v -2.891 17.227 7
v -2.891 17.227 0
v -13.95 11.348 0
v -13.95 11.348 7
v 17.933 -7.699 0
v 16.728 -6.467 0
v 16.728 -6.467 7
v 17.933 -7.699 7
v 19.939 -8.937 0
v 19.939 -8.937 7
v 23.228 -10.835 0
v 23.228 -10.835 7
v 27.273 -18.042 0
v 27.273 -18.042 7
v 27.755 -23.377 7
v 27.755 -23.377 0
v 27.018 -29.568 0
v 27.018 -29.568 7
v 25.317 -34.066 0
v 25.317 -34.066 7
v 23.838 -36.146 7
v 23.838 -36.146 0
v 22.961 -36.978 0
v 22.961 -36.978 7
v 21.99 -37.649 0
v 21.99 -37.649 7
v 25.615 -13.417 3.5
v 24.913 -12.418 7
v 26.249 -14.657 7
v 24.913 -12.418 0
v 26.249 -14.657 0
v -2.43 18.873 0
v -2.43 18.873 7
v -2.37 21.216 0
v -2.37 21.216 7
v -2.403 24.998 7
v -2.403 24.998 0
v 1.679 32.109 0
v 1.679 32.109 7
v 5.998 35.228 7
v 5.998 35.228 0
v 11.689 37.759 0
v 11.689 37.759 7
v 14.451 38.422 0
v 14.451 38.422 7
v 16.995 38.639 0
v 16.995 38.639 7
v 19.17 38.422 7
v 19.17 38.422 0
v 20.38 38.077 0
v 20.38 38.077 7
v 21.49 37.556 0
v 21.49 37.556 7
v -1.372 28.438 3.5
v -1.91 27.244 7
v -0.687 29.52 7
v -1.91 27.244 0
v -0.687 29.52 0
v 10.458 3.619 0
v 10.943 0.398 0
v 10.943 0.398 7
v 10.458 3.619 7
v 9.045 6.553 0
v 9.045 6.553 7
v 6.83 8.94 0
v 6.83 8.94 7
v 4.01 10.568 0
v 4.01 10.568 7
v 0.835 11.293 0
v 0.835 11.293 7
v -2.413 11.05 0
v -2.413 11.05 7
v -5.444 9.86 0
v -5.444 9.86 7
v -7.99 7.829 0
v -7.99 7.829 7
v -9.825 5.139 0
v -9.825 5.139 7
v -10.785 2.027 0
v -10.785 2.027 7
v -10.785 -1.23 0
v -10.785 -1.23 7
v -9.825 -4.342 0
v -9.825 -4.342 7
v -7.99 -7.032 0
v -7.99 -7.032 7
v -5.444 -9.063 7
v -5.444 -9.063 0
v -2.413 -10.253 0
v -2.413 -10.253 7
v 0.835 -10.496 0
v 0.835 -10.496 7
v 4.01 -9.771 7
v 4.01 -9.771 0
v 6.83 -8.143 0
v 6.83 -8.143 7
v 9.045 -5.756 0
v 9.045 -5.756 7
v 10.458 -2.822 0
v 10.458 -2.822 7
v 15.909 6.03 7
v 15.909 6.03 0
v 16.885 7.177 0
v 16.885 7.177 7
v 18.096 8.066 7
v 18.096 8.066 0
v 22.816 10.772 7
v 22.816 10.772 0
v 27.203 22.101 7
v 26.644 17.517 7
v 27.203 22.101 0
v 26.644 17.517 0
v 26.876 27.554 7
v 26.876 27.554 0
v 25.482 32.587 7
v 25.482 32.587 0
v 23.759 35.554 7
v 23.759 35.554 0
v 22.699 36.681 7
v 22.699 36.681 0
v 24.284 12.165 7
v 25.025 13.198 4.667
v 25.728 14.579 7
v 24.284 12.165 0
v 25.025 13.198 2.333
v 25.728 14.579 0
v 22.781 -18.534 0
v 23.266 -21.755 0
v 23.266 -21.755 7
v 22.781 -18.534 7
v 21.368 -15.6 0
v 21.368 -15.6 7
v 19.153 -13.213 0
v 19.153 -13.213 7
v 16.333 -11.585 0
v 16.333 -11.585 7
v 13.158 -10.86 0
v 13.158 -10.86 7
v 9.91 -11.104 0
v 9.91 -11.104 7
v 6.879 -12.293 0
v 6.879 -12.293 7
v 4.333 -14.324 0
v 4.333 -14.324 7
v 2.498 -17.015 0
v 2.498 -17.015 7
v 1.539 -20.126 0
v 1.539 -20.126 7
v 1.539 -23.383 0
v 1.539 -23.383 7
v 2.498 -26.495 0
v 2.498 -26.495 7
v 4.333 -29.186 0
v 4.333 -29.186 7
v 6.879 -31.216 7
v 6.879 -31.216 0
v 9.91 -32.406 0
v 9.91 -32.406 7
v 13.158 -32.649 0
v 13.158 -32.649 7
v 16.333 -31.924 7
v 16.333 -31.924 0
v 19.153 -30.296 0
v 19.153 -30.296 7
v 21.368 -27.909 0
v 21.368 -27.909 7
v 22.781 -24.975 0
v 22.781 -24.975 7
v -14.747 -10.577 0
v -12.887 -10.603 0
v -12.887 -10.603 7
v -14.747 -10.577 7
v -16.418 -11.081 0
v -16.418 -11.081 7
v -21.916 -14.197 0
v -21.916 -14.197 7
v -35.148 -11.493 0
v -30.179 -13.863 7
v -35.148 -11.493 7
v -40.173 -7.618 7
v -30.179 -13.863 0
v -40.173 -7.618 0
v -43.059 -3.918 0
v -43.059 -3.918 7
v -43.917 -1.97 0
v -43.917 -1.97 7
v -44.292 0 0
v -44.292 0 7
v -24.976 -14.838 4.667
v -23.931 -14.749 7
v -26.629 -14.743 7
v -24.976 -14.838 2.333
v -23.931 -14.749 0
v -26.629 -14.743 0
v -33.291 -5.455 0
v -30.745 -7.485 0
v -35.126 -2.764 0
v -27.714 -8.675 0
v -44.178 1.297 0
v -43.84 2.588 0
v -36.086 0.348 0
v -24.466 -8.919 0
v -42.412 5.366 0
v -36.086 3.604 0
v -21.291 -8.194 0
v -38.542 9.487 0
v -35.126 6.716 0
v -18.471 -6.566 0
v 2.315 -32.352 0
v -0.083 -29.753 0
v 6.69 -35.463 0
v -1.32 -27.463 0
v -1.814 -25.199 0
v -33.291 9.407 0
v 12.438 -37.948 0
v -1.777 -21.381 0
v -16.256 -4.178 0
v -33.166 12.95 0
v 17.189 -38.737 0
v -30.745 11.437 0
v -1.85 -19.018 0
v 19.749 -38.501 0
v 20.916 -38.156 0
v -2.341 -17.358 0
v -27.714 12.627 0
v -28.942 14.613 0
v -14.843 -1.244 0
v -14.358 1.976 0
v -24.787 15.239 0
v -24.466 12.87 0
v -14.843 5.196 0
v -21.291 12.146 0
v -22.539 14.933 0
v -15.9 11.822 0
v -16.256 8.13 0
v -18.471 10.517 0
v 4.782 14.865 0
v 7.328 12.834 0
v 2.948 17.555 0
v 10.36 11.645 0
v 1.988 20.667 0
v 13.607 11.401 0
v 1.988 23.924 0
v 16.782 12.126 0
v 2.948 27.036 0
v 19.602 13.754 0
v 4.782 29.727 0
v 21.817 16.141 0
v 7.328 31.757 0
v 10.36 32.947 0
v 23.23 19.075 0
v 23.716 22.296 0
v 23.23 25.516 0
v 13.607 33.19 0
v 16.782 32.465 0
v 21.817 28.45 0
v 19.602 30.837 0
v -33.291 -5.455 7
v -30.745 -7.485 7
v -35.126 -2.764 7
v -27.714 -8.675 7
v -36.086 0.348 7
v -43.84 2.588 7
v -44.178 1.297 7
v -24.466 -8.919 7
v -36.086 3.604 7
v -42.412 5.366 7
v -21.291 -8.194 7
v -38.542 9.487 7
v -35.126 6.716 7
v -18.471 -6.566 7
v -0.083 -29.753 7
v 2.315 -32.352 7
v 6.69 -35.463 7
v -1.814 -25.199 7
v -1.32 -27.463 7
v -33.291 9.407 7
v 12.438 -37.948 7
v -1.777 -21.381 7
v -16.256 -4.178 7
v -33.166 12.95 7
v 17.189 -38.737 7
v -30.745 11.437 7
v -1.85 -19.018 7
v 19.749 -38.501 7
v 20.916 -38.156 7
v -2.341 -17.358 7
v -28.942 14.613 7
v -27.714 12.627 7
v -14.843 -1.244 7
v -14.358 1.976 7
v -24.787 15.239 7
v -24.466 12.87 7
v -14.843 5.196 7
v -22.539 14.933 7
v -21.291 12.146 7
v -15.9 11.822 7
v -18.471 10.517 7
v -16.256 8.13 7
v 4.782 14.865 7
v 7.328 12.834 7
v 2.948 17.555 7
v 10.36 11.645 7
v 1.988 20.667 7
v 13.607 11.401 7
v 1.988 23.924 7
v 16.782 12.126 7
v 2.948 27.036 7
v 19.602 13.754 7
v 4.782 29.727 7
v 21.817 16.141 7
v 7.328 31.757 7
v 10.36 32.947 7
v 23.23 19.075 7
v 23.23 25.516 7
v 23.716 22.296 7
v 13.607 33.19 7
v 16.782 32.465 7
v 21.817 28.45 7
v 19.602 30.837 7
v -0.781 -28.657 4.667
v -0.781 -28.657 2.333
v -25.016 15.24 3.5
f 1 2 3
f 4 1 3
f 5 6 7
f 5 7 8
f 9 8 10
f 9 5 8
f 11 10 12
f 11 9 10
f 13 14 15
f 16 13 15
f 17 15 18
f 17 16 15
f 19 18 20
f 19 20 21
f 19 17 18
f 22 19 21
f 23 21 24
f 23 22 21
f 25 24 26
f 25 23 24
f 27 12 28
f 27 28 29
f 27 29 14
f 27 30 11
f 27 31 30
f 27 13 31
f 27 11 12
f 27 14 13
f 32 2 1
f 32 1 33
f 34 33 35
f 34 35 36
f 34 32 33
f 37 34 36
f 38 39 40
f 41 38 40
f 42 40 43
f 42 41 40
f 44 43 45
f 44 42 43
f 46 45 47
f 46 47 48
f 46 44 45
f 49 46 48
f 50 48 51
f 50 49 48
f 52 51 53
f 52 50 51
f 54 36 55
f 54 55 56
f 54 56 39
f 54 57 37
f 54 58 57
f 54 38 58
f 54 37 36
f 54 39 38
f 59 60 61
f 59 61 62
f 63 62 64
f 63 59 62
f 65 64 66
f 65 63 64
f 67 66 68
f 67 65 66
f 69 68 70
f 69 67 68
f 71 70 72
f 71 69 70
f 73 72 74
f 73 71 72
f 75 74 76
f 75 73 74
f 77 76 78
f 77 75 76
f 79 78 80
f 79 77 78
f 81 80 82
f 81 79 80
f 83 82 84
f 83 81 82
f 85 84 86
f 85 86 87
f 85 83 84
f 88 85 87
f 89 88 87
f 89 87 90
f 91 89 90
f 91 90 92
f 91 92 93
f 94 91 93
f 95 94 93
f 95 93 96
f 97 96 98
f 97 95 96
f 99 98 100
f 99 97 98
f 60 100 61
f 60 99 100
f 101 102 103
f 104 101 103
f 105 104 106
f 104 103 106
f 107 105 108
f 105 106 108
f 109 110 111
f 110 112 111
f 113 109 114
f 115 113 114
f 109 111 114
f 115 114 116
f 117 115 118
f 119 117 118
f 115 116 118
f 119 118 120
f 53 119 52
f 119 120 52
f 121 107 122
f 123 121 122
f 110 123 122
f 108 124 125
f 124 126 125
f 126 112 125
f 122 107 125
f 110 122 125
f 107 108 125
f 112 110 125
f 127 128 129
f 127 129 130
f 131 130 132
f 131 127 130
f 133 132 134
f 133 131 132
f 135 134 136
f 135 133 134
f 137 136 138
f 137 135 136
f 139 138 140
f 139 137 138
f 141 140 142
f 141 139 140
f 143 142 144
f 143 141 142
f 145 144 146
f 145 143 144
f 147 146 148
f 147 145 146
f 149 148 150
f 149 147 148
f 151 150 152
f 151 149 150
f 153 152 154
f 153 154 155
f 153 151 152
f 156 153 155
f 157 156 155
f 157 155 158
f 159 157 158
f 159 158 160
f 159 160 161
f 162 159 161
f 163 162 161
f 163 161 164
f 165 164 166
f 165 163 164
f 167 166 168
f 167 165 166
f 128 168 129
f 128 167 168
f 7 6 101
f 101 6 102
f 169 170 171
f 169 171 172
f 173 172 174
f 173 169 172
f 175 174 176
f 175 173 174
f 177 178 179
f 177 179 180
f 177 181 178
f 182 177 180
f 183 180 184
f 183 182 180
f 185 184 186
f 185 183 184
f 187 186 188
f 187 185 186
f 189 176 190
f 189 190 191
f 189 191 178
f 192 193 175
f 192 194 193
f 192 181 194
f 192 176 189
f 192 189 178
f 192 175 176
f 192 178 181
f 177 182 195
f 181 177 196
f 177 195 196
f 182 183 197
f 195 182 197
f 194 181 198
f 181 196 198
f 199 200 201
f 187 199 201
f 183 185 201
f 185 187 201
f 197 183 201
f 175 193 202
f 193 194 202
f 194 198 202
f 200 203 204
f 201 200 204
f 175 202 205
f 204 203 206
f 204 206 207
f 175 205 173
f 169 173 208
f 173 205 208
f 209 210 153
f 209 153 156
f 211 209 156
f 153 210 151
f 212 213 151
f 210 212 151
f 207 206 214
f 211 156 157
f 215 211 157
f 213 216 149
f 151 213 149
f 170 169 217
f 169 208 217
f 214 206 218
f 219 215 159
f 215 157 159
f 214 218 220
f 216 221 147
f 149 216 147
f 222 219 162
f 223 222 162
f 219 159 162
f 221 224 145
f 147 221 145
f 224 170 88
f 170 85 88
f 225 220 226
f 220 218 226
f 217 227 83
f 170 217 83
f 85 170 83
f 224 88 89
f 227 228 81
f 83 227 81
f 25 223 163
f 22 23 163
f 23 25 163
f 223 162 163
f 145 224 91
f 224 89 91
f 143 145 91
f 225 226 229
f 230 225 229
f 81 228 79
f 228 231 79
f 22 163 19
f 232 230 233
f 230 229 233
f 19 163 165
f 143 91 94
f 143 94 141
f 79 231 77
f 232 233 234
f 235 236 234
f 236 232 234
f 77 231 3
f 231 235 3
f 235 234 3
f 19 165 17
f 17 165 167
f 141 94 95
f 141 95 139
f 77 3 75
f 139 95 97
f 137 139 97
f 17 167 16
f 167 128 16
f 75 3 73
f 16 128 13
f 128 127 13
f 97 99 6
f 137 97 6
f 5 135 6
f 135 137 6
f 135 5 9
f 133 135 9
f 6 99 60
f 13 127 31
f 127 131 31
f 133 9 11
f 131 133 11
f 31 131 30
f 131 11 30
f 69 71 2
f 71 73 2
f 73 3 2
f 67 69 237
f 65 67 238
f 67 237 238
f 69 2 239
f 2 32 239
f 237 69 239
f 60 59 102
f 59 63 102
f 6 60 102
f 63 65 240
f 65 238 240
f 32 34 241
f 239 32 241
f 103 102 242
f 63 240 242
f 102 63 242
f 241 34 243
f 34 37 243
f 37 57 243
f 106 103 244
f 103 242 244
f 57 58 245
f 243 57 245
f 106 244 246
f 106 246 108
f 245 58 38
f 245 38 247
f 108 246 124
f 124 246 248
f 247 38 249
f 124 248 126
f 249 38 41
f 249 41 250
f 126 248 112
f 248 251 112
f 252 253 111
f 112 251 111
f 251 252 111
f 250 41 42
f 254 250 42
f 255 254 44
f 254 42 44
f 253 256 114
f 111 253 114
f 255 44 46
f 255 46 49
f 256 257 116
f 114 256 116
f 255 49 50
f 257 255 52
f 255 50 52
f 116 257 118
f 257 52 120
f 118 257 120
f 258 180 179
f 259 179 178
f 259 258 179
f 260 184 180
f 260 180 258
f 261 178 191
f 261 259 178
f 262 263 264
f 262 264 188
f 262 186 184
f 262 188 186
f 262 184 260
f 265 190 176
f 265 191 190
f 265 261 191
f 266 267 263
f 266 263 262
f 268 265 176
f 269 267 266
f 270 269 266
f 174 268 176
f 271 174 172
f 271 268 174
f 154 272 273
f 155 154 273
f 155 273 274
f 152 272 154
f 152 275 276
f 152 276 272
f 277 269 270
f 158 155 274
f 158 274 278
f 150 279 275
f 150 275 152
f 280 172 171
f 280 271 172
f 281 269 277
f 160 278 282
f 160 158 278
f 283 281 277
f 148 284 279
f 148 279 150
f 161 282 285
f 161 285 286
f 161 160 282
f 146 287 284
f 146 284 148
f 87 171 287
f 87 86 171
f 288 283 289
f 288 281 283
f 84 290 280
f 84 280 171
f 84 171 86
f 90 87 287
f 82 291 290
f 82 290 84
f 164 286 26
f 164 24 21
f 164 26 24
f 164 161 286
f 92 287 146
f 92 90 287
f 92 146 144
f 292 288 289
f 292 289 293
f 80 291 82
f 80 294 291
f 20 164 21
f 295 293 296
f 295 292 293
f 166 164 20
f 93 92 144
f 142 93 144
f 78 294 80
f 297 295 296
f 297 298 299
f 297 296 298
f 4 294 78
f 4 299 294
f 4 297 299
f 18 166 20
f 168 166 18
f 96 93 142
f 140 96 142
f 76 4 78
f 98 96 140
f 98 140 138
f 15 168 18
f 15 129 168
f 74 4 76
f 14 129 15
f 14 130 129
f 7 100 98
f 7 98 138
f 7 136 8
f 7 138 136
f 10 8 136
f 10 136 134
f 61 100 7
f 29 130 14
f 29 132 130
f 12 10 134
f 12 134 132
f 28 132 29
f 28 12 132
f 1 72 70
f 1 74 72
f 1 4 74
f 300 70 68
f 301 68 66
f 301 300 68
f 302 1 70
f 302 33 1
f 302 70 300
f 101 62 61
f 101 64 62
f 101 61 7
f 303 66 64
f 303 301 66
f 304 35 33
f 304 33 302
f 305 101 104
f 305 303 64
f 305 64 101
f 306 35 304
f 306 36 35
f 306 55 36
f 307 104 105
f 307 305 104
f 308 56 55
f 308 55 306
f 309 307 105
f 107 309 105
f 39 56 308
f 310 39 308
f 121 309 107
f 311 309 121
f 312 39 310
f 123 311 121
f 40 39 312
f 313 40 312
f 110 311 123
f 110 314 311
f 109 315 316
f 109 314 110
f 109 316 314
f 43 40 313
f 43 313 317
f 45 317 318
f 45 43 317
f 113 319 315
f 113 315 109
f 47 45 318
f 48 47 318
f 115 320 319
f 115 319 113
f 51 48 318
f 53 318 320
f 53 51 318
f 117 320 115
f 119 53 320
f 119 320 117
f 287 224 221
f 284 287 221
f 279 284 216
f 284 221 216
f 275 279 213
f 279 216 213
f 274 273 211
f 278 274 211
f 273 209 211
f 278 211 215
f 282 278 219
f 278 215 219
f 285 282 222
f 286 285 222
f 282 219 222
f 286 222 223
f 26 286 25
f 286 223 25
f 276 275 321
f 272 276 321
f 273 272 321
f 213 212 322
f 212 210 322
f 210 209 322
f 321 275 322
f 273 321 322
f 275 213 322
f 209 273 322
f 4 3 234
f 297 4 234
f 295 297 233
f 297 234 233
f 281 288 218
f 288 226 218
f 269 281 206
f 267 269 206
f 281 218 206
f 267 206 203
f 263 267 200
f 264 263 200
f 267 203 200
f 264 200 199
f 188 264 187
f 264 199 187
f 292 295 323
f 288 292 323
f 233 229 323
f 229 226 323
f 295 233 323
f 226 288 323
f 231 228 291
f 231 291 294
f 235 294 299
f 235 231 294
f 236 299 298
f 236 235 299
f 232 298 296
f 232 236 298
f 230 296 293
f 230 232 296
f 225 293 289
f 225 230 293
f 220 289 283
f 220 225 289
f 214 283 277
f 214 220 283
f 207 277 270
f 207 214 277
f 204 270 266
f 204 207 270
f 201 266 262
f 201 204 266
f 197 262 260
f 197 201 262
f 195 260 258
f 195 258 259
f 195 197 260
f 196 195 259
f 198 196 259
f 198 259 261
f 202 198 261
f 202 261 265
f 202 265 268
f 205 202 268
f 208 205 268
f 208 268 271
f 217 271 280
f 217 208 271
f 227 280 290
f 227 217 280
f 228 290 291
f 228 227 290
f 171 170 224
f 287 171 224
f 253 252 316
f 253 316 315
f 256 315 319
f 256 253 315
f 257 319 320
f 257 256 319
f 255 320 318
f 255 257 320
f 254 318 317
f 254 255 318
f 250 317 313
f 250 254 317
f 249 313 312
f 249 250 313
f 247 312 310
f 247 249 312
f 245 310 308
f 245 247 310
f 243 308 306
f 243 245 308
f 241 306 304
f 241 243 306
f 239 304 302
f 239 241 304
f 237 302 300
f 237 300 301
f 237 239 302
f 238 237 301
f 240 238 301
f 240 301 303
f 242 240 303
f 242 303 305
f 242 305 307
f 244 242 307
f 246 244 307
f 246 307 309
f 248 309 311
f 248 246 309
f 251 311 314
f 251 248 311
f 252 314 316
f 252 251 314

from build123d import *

# Parameters (mm, degrees)
F0_R     = 10.925
F1_DEPTH = 7


with BuildPart() as f1:
    # F0 (on Top) → F1 (new body)
    with BuildSketch(Plane.XY):
        with BuildLine():
            add(Edge.make_bspline(
                [(-6.4395543964, 13.2348172529), (-9.1292198143, 12.2456790048), (-11.7414815686, 11.1713296384), (-13.9497888892, 11.3483672356)],
                knots=[0.1400697691, 0.1400697691, 0.1400697691, 0.1400697691, 0.3121200653, 0.3121200653, 0.3121200653, 0.3121200653], degree=3))
            add(Edge.make_bspline(
                [(-13.9497888892, 11.3483672356), (-17.5573593522, 11.6375822379), (-23.7480393822, 20.5188284103), (-44.3087168864, 7.5057952096), (-44.2924838881, 0)],
                knots=[0.3121200653, 0.3121200653, 0.3121200653, 0.3121200653, 0.5931876328, 1, 1, 1, 1], degree=3))
            add(Edge.make_bspline(
                [(-12.887299612, -10.6033772899), (-13.4512132627, -10.5222545013), (-17.6938513535, -10.3298112003), (-23.4895130797, -20.2738643689), (-43.8788694911, -7.371346434), (-44.2924838881, 0)],
                knots=[0.278216512, 0.278216512, 0.278216512, 0.278216512, 0.3185350392, 0.5938778395, 0.9927419326, 0.9927419326, 0.9927419326, 0.9927419326], degree=3))
            add(Edge.make_bspline(
                [(-7.0311428775, -12.4986186093), (-9.0891121607, -11.6866108154), (-11.0989087543, -10.8606493977), (-12.887299612, -10.6033772899)],
                knots=[0.1503506848, 0.1503506848, 0.1503506848, 0.1503506848, 0.278216512, 0.278216512, 0.278216512, 0.278216512], degree=3))
            add(Edge.make_bspline(
                [(-7.0311428775, -12.4986186093), (-5.0355845098, -14.0840137015), (-3.1635826547, -15.6293105857), (-2.3408499564, -17.3583158347)],
                knots=[0.1677034297, 0.1677034297, 0.1677034297, 0.1677034297, 0.3163832996, 0.3163832996, 0.3163832996, 0.3163832996], degree=3))
            add(Edge.make_bspline(
                [(-2.3408499564, -17.3583158347), (-2.327038362, -17.3873414455), (-0.8208991693, -20.6275709181), (-6.2778244318, -30.204015976), (15.5191329345, -41.4031973523), (21.9899696205, -37.6485751695)],
                knots=[0.3163832996, 0.3163832996, 0.3163832996, 0.3163832996, 0.3188792574, 0.594519601, 1, 1, 1, 1], degree=3))
            add(Edge.make_bspline(
                [(16.7283741857, -6.4672911408), (18.786584329, -9.3376357175), (29.6744078467, -9.4662536369), (28.481763025, -33.9192331377), (21.9899696205, -37.6485751695)],
                knots=[0.3188786975, 0.3188786975, 0.3188786975, 0.3188786975, 0.5942210158, 1, 1, 1, 1], degree=3))
            add(Edge.make_bspline(
                [(14.5053291097, 1.8450627629), (15.0185483744, -1.3196723959), (15.3415537221, -4.5332551), (16.7283741857, -6.4672911408)],
                knots=[0.1333532483, 0.1333532483, 0.1333532483, 0.1333532483, 0.3188786975, 0.3188786975, 0.3188786975, 0.3188786975], degree=3))
            add(Edge.make_bspline(
                [(14.5053291097, 1.8450627629), (14.8069082277, 3.4605447135), (15.20732089, 4.9267216062), (15.9087433766, 6.0301086055)],
                knots=[0.2104833034, 0.2104833034, 0.2104833034, 0.2104833034, 0.3108563735, 0.3108563735, 0.3108563735, 0.3108563735], degree=3))
            add(Edge.make_bspline(
                [(15.9087433766, 6.0301086055), (15.9624030761, 6.1145190941), (18.0051316038, 9.1474766545), (29.1059131262, 9.1929649799), (27.9873138953, 33.8233167393), (21.4900302358, 37.5558127591)],
                knots=[0.3108563735, 0.3108563735, 0.3108563735, 0.3108563735, 0.3185350392, 0.5938778395, 1, 1, 1, 1], degree=3))
            add(Edge.make_bspline(
                [(-2.8908584222, 17.2268748699), (-1.431266538, 20.4410048292), (-6.8808579099, 29.9699369249), (15.0089520333, 41.316377454), (21.4900302358, 37.5558127591)],
                knots=[0.3185350392, 0.3185350392, 0.3185350392, 0.3185350392, 0.5938778395, 1, 1, 1, 1], degree=3))
            add(Edge.make_bspline(
                [(-6.4395543964, 13.2348172529), (-4.8831854727, 14.5225004957), (-3.5328470445, 15.8131681433), (-2.8908584222, 17.2268748699)],
                knots=[0.197427936, 0.197427936, 0.197427936, 0.197427936, 0.3185350392, 0.3185350392, 0.3185350392, 0.3185350392], degree=3))
        make_face()
        with Locations((12.3414872441, -21.7546906004)):
            Circle(F0_R, mode=Mode.SUBTRACT)
        with Locations((0.018236467, 0.3984128004)):
            Circle(F0_R, mode=Mode.SUBTRACT)
        with Locations((-25.2826381154, 1.9758301096)):
            Circle(F0_R, mode=Mode.SUBTRACT)
        with Locations((12.7906060968, 22.2956517596)):
            Circle(F0_R, mode=Mode.SUBTRACT)
        with BuildLine():
            Line((-2.8908584222, 17.2268748699), (-13.9497888892, 11.3483672356))
            add(Edge.make_bspline(
                [(-6.4395543964, 13.2348172529), (-9.1292198143, 12.2456790048), (-11.7414815686, 11.1713296384), (-13.9497888892, 11.3483672356)],
                knots=[0.1400697691, 0.1400697691, 0.1400697691, 0.1400697691, 0.3121200653, 0.3121200653, 0.3121200653, 0.3121200653], degree=3))
            add(Edge.make_bspline(
                [(-6.4395543964, 13.2348172529), (-4.8831854727, 14.5225004957), (-3.5328470445, 15.8131681433), (-2.8908584222, 17.2268748699)],
                knots=[0.197427936, 0.197427936, 0.197427936, 0.197427936, 0.3185350392, 0.3185350392, 0.3185350392, 0.3185350392], degree=3))
        make_face()
        with BuildLine():
            add(Edge.make_bspline(
                [(-7.0311428775, -12.4986186093), (-9.0891121607, -11.6866108154), (-11.0989087543, -10.8606493977), (-12.887299612, -10.6033772899)],
                knots=[0.1503506848, 0.1503506848, 0.1503506848, 0.1503506848, 0.278216512, 0.278216512, 0.278216512, 0.278216512], degree=3))
            Line((-12.887299612, -10.6033772899), (-2.3408499564, -17.3583158347))
            add(Edge.make_bspline(
                [(-7.0311428775, -12.4986186093), (-5.0355845098, -14.0840137015), (-3.1635826547, -15.6293105857), (-2.3408499564, -17.3583158347)],
                knots=[0.1677034297, 0.1677034297, 0.1677034297, 0.1677034297, 0.3163832996, 0.3163832996, 0.3163832996, 0.3163832996], degree=3))
        make_face()
        with BuildLine():
            Line((16.7283741857, -6.4672911408), (15.9087433766, 6.0301086055))
            add(Edge.make_bspline(
                [(14.5053291097, 1.8450627629), (14.8069082277, 3.4605447135), (15.20732089, 4.9267216062), (15.9087433766, 6.0301086055)],
                knots=[0.2104833034, 0.2104833034, 0.2104833034, 0.2104833034, 0.3108563735, 0.3108563735, 0.3108563735, 0.3108563735], degree=3))
            add(Edge.make_bspline(
                [(14.5053291097, 1.8450627629), (15.0185483744, -1.3196723959), (15.3415537221, -4.5332551), (16.7283741857, -6.4672911408)],
                knots=[0.1333532483, 0.1333532483, 0.1333532483, 0.1333532483, 0.3188786975, 0.3188786975, 0.3188786975, 0.3188786975], degree=3))
        make_face()
    extrude(amount=F1_DEPTH)


solid = f1.part
